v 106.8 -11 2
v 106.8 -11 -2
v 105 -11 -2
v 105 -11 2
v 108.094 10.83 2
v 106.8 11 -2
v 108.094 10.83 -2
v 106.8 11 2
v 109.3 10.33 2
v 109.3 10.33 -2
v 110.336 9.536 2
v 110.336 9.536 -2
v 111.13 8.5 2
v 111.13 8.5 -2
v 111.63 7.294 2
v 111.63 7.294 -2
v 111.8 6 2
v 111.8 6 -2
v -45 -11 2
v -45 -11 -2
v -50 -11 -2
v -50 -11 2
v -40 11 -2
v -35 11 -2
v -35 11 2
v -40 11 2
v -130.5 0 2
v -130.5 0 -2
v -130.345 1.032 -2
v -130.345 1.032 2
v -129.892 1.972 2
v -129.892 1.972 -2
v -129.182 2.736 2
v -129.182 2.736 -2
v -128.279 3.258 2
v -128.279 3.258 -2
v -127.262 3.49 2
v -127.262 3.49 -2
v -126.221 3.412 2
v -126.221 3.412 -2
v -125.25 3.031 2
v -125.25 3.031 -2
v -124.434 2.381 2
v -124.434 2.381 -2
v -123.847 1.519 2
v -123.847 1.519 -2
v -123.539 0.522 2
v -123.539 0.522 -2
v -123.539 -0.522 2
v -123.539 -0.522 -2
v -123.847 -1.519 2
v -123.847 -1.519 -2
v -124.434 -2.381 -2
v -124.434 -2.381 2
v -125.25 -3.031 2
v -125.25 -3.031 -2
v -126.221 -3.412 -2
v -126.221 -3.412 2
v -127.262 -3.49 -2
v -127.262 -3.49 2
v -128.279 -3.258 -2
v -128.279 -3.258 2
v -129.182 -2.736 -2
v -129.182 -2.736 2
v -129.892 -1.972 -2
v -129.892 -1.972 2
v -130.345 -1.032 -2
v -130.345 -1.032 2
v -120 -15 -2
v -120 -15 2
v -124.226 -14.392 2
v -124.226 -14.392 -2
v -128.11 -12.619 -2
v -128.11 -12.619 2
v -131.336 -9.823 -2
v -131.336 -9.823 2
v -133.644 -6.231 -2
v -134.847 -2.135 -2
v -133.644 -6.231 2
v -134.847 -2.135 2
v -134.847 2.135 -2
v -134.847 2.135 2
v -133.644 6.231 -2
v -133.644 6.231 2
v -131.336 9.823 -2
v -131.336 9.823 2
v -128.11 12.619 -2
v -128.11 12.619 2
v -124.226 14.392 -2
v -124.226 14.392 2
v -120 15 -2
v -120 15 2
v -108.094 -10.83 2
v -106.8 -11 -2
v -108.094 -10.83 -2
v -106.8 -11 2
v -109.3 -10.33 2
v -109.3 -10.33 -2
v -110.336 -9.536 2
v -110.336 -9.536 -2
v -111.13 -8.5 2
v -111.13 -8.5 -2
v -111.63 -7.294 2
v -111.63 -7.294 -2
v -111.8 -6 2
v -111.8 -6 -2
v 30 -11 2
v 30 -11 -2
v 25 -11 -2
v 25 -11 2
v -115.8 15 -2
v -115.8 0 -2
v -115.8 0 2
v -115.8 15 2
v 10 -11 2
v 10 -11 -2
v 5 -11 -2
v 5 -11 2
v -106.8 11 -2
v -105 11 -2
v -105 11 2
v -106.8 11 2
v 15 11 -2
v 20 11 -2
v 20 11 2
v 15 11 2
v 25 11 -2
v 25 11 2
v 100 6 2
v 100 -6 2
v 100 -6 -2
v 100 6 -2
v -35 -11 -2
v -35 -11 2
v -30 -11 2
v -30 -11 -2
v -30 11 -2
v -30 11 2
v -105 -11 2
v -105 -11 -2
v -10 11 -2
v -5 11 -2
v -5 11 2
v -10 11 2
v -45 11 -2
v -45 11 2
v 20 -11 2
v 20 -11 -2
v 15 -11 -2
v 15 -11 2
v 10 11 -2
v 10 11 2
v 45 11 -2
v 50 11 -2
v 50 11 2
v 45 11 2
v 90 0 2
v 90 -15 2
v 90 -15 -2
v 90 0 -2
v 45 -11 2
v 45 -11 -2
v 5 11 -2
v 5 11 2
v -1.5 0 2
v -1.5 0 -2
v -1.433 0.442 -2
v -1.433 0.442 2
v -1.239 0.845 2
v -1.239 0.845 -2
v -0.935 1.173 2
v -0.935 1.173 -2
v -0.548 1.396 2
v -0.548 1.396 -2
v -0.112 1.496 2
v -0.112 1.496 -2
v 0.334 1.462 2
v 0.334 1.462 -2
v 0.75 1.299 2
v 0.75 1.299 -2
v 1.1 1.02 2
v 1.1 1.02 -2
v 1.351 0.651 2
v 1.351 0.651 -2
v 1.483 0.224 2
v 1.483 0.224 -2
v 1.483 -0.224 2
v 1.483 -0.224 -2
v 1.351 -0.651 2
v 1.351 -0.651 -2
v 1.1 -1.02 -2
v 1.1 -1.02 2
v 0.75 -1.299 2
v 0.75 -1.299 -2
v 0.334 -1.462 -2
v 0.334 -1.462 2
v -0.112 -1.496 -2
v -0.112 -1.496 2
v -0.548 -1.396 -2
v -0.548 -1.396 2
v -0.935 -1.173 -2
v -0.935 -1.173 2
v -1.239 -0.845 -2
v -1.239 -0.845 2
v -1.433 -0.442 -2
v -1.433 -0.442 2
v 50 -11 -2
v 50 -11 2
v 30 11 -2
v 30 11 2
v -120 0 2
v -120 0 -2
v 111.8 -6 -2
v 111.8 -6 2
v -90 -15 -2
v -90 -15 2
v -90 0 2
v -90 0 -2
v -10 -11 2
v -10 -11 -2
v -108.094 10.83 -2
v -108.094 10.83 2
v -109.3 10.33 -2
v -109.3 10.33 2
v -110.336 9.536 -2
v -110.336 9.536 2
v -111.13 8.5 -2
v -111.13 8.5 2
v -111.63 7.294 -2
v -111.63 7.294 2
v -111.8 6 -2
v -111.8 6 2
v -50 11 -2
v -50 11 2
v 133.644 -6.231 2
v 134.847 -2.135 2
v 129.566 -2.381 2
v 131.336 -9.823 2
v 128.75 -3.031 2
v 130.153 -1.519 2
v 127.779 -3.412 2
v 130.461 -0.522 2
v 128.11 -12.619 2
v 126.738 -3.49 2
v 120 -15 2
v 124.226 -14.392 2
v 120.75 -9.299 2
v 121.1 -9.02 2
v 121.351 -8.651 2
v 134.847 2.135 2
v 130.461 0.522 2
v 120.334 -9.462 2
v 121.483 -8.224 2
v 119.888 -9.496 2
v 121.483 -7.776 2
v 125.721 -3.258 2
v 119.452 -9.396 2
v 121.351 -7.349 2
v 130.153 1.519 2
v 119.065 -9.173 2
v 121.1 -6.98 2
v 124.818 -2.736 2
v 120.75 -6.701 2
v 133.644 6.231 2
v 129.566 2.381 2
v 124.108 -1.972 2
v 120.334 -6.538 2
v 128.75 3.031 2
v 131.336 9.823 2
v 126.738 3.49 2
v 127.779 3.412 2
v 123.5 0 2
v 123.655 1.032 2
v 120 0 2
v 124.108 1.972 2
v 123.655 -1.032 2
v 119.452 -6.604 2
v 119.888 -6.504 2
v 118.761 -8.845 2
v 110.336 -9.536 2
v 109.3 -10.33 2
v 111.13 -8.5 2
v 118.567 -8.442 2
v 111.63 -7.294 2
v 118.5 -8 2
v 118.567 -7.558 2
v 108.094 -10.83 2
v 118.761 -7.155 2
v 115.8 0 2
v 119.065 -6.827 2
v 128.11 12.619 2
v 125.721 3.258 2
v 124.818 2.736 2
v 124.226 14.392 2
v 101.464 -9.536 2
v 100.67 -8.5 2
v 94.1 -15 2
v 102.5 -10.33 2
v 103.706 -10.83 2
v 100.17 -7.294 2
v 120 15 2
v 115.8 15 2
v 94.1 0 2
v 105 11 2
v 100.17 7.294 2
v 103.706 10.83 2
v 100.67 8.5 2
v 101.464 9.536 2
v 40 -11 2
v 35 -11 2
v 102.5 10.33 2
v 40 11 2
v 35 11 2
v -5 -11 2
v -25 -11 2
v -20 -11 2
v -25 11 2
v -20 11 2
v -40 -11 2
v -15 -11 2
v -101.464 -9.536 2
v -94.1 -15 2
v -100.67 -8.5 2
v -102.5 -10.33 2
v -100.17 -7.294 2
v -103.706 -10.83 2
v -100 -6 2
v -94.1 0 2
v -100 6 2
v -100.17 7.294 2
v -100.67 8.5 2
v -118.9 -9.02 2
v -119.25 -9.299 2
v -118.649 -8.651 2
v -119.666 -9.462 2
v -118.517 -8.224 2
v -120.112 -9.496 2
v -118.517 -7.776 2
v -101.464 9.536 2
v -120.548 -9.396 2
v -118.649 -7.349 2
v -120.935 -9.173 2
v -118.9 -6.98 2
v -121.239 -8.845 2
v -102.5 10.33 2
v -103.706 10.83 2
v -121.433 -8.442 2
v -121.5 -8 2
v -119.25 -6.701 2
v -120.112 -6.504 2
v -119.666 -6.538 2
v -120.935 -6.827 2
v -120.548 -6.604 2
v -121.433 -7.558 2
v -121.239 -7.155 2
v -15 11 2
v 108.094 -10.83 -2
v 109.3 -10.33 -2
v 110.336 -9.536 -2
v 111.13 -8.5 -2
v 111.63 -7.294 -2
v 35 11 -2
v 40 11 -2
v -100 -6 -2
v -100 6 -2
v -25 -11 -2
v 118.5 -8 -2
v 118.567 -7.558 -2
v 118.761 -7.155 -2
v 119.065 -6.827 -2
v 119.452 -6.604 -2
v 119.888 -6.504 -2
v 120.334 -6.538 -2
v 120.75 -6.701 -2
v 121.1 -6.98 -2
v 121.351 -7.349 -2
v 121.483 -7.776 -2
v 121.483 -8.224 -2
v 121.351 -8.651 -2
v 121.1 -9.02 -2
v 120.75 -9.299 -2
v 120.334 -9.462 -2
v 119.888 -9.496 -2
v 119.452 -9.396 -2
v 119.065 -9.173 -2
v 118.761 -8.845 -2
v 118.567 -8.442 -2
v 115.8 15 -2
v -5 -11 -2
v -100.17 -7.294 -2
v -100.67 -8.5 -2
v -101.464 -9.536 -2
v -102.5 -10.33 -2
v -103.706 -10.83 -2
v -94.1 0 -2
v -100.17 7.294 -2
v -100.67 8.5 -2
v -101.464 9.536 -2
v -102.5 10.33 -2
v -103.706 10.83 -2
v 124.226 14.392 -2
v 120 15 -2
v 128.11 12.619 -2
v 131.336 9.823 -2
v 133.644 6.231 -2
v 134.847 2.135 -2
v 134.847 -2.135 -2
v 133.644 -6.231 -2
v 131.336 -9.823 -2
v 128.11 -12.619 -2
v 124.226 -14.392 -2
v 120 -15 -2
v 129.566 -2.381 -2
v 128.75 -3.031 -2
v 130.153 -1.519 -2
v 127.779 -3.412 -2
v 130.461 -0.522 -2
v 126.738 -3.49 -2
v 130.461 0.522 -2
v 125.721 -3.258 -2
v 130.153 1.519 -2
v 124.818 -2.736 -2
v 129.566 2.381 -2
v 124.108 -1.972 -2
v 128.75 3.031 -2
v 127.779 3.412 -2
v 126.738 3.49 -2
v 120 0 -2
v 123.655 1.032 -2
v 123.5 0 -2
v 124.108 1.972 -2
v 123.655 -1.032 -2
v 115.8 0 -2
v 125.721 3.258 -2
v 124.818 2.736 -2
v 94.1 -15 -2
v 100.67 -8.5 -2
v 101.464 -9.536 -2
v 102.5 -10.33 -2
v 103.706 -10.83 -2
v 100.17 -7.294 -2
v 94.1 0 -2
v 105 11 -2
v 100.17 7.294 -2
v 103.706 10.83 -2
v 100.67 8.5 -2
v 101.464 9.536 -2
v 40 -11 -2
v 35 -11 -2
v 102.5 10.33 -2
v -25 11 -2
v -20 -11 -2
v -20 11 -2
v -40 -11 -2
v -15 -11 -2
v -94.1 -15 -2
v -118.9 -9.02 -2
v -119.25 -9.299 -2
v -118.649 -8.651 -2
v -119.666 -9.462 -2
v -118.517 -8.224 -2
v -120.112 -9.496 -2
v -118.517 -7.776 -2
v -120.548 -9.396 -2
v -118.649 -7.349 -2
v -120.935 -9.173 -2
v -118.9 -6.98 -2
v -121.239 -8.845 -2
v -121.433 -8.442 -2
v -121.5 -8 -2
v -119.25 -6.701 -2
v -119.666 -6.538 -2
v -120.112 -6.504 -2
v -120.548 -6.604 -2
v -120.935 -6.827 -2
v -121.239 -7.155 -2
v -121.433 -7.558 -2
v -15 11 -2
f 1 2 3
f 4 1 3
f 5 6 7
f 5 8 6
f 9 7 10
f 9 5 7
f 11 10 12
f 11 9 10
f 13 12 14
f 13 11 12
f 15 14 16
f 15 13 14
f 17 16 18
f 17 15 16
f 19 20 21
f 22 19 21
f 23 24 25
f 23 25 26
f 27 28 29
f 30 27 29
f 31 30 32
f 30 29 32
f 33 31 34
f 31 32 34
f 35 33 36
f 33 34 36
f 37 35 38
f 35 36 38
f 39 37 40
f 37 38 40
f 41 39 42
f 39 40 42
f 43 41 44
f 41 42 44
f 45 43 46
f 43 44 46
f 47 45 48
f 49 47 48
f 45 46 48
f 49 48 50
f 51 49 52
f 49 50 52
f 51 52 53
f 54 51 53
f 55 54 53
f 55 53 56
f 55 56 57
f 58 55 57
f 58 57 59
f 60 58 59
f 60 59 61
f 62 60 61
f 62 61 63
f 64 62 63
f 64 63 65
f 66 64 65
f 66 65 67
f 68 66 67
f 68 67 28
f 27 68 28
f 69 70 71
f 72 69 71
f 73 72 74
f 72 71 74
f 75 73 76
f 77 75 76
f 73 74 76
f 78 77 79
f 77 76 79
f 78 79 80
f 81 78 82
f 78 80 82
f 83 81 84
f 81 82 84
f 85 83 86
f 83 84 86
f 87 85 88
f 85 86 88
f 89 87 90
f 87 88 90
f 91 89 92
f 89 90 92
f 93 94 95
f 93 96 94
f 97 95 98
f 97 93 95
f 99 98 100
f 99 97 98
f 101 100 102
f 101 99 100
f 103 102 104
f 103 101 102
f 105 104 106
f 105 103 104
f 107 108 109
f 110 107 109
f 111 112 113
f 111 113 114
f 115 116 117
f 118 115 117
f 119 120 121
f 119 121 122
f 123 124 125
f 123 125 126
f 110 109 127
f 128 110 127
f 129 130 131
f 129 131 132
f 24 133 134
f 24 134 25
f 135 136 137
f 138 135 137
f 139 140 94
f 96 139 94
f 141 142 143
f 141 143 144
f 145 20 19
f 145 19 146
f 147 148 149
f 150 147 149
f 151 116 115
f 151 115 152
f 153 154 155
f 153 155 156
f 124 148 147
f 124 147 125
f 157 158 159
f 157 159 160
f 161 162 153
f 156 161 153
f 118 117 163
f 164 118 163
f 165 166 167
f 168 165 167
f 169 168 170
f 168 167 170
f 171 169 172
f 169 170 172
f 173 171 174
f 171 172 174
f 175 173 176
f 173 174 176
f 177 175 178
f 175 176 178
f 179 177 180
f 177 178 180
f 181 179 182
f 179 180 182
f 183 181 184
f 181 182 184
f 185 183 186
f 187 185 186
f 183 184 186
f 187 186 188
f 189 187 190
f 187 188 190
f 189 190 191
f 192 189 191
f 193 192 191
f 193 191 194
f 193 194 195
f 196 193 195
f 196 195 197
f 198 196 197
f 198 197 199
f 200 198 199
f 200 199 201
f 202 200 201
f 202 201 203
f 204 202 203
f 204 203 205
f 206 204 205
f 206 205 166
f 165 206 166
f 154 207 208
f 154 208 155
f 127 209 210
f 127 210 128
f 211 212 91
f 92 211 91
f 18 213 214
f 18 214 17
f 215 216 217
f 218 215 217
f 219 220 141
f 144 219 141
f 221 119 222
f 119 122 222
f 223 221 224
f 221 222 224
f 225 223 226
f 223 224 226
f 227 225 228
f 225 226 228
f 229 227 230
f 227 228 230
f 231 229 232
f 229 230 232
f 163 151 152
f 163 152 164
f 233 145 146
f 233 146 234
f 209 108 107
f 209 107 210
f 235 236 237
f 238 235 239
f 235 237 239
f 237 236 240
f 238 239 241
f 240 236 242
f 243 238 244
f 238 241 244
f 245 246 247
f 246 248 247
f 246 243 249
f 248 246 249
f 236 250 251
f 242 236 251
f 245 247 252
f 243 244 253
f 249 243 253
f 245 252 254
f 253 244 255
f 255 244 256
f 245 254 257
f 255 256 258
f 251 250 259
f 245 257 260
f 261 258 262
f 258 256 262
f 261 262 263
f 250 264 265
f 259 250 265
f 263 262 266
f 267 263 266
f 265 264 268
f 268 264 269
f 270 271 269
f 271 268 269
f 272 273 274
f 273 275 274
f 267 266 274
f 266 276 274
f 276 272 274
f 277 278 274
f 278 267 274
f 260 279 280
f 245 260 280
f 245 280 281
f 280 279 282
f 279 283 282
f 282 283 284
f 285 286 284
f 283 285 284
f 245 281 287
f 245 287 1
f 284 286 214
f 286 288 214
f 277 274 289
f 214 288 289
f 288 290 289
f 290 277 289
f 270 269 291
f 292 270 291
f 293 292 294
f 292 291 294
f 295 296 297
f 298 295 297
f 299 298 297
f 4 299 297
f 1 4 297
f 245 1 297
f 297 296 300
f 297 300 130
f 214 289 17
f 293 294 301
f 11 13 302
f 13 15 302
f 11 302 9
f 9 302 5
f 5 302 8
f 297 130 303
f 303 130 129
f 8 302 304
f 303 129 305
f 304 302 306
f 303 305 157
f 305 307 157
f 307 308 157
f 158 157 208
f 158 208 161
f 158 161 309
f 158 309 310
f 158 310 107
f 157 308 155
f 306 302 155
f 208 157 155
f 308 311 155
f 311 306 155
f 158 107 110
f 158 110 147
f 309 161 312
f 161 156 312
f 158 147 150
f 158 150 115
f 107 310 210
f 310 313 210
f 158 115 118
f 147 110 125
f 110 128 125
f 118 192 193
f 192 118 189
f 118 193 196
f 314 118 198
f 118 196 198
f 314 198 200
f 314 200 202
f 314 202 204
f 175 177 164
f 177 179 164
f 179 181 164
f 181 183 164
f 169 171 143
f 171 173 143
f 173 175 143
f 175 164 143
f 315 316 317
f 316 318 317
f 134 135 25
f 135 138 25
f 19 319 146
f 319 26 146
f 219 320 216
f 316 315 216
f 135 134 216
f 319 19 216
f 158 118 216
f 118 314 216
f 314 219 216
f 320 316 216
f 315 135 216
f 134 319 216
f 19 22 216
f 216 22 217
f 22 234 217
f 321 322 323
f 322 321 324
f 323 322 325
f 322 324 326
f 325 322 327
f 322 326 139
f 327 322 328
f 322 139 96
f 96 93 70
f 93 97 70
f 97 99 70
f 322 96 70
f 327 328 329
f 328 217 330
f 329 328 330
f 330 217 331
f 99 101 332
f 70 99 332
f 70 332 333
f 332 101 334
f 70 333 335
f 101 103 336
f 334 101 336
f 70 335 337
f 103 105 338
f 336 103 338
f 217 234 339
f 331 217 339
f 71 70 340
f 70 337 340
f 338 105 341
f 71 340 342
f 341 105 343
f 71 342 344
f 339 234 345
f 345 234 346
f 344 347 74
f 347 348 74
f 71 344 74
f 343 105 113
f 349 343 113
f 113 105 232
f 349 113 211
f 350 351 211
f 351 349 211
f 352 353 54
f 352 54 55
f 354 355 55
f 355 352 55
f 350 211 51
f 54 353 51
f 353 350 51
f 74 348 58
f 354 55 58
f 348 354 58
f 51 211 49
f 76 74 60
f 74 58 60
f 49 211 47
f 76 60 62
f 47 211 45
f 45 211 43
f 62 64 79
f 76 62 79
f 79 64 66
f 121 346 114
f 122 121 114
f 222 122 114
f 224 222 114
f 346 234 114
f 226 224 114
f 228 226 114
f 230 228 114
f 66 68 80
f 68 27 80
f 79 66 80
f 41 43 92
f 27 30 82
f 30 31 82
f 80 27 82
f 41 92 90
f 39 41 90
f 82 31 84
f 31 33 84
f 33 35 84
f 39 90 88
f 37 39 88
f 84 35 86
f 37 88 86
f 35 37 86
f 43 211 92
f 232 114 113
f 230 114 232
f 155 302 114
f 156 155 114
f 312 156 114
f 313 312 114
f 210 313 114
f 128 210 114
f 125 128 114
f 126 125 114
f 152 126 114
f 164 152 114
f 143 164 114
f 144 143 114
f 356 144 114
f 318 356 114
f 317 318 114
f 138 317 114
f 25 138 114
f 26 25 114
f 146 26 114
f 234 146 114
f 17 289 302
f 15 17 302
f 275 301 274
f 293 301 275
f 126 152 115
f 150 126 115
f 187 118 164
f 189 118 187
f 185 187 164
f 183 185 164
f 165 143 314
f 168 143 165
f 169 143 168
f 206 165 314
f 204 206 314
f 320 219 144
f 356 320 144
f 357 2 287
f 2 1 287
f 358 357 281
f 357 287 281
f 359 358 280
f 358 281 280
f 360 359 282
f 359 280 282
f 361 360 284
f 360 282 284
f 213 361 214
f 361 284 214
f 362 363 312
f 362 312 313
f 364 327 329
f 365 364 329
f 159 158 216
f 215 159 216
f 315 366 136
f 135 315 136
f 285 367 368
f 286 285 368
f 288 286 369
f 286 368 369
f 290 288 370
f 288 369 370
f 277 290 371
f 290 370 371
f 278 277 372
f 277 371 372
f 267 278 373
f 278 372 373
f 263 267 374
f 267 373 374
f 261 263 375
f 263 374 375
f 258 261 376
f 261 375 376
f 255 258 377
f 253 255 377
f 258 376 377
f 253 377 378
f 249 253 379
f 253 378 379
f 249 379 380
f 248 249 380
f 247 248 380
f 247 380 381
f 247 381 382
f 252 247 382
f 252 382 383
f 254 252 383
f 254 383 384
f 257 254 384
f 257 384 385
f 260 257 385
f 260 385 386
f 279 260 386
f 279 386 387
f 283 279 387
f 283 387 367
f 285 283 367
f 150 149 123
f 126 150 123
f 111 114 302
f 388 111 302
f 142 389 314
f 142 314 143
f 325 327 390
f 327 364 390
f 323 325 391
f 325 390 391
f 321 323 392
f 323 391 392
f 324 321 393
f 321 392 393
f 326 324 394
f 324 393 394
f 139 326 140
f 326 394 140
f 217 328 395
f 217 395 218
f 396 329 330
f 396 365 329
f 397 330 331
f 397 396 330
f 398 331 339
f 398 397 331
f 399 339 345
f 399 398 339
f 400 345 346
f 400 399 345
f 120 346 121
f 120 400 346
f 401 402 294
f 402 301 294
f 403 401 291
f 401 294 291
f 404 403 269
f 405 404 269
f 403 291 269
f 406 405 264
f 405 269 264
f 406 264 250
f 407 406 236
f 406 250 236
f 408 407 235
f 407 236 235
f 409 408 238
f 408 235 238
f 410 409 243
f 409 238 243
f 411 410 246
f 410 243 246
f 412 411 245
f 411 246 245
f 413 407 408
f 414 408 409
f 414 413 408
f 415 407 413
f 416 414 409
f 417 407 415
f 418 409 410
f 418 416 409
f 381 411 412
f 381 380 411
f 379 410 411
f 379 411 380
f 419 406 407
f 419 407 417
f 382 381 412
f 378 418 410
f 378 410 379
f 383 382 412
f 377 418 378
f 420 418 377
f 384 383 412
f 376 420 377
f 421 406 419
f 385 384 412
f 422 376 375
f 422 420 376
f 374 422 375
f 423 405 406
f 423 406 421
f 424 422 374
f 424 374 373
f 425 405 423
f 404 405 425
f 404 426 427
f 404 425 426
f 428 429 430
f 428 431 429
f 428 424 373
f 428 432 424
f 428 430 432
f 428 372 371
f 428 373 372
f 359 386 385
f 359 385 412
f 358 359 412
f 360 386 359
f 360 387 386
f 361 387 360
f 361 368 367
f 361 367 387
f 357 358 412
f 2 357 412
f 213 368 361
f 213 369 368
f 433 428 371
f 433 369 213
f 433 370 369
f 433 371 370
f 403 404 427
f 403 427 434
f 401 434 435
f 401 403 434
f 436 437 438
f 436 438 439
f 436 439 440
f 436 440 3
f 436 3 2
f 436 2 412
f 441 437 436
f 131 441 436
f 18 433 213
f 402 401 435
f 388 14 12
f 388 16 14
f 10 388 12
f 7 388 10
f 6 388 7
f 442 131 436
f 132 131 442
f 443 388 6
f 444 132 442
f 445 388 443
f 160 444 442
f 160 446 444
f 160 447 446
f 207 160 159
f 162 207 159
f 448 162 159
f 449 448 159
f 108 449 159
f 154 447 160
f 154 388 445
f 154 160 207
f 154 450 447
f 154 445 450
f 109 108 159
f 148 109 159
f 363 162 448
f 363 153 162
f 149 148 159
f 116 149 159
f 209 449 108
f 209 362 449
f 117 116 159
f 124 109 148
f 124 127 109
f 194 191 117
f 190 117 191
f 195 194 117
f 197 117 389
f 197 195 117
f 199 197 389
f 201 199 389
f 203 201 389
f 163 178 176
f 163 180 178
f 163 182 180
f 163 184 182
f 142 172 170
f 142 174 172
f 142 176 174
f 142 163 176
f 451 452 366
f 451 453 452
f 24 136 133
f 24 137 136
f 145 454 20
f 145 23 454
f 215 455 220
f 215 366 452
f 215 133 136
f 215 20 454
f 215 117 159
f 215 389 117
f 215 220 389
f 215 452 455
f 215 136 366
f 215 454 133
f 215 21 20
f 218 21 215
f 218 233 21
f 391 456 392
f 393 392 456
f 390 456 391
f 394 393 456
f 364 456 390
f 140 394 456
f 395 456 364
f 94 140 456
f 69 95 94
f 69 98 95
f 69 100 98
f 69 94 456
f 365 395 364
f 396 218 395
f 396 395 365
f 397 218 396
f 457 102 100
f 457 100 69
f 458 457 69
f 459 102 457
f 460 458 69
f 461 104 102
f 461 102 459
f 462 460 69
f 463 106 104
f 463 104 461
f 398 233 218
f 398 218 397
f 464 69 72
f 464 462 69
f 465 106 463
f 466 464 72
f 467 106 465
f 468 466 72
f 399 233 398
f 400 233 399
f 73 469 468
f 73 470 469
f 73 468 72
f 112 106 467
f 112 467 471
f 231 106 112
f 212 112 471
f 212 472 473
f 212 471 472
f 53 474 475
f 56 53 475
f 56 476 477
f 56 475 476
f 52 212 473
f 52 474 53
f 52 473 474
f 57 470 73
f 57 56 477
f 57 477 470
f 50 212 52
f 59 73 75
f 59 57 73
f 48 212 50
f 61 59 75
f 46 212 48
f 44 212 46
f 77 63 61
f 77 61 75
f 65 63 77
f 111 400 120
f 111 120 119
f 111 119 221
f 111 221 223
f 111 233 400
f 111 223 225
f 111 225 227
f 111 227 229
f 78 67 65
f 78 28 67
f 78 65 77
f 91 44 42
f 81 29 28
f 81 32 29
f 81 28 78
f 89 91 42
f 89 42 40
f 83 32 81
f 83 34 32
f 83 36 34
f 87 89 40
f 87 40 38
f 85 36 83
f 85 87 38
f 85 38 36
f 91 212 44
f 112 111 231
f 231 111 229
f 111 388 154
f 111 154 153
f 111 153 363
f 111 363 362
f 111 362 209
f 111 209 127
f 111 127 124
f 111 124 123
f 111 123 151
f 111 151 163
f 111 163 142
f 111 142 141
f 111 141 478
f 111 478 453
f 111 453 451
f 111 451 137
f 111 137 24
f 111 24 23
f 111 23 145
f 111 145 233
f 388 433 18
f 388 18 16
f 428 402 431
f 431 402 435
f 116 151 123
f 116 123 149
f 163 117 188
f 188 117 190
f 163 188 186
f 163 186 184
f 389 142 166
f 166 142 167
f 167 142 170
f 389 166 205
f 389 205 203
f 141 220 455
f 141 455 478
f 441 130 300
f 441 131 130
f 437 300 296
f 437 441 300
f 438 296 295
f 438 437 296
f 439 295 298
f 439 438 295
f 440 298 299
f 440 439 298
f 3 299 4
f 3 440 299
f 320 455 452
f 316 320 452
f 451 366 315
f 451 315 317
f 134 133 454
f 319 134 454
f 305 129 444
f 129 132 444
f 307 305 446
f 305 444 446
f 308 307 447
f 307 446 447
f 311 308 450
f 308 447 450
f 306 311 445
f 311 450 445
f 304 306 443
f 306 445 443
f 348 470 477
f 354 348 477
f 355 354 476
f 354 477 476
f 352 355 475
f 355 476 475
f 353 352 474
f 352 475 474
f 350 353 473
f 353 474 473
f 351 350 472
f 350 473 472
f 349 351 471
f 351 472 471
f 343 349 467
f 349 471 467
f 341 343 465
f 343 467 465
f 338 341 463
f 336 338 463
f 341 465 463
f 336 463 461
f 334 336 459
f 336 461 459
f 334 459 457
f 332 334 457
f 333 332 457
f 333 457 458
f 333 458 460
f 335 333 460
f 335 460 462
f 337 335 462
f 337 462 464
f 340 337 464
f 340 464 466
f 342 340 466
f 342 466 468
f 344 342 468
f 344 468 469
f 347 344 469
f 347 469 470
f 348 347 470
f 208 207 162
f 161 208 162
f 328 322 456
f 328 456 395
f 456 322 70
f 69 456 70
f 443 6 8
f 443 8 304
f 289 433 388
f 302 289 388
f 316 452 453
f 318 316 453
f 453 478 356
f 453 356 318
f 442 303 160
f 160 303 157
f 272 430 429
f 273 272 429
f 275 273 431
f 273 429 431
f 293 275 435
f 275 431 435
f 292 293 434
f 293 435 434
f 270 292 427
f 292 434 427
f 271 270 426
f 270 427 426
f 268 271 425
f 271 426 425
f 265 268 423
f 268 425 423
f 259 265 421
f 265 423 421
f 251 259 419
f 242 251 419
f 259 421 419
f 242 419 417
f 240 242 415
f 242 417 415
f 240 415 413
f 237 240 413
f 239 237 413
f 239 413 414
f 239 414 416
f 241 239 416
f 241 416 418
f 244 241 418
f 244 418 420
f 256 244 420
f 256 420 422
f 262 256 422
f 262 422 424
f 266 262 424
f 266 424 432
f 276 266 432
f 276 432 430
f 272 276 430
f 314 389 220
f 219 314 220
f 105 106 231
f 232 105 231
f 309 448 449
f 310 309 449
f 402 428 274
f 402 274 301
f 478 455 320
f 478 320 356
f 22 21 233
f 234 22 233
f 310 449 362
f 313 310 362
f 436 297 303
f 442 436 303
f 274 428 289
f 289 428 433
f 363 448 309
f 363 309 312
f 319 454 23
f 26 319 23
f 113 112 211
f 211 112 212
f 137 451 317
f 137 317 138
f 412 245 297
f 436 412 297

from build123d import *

# Parameters (mm, degrees)
EXTRUDE_1_DEPTH     = 2
SKETCH_11_W         = 4.2
SKETCH_11_H         = 15
SKETCH_11_W_2       = 46.8
SKETCH_11_H_2       = 22
SKETCH_11_W_3       = 5
SKETCH_11_R         = 3.5
SKETCH_11_R_2       = 1.5
CUT_EXTRUDE_1_DEPTH = 10
SKETCH_12_W         = 45
SKETCH_12_H         = 22
EXTRUDE_2_DEPTH     = 4
SKETCH_13_W         = 4.1
SKETCH_13_H         = 15
CUT_EXTRUDE_2_DEPTH = 136.889661123
FILLET_1_R          = 5


with BuildPart() as part:
    # Эскиз1 → Бобышка-Вытянуть1 (new, symmetric)
    with BuildSketch(Plane.XY):
        with BuildLine():
            Line((-120, 15), (120, 15))
            ThreePointArc((120, 15), (135, 0), (120, -15))
            Line((120, -15), (-120, -15))
            ThreePointArc((-120, -15), (-135, 0), (-120, 15))
        make_face()
    extrude(amount=EXTRUDE_1_DEPTH, both=True)

    # Эскиз11 → Вырез-Вытянуть1 (cut)
    with BuildSketch(Plane(origin=(0, 0, -2), x_dir=(-1, 0, 0), z_dir=(0, 0, -1))):
        with Locations((-117.9, 7.5)):
            Rectangle(SKETCH_11_W, SKETCH_11_H)
        with Locations((-88.4, 0)):
            Rectangle(SKETCH_11_W_2, SKETCH_11_H_2)
        with Locations((-57.5, 0)):
            Rectangle(SKETCH_11_W_3, SKETCH_11_H_2)
        with Locations((-47.5, 0)):
            Rectangle(SKETCH_11_W_3, SKETCH_11_H_2)
        with Locations((-37.5, 0)):
            Rectangle(SKETCH_11_W_3, SKETCH_11_H_2)
        with Locations((-27.5, 0)):
            Rectangle(SKETCH_11_W_3, SKETCH_11_H_2)
        with Locations((-17.5, 0)):
            Rectangle(SKETCH_11_W_3, SKETCH_11_H_2)
        with Locations((-7.5, 0)):
            Rectangle(SKETCH_11_W_3, SKETCH_11_H_2)
        with Locations((7.5, 0)):
            Rectangle(SKETCH_11_W_3, SKETCH_11_H_2)
        with Locations((17.5, 0)):
            Rectangle(SKETCH_11_W_3, SKETCH_11_H_2)
        with Locations((27.5, 0)):
            Rectangle(SKETCH_11_W_3, SKETCH_11_H_2)
        with Locations((37.5, 0)):
            Rectangle(SKETCH_11_W_3, SKETCH_11_H_2)
        with Locations((47.5, 0)):
            Rectangle(SKETCH_11_W_3, SKETCH_11_H_2)
        with Locations((57.5, 0)):
            Rectangle(SKETCH_11_W_3, SKETCH_11_H_2)
        with Locations((88.4, 0)):
            Rectangle(SKETCH_11_W_2, SKETCH_11_H_2)
        with Locations((117.9, 7.5)):
            Rectangle(SKETCH_11_W, SKETCH_11_H)
        with Locations((127, 0)):
            Circle(SKETCH_11_R)
        with Locations((-127, 0)):
            Circle(SKETCH_11_R)
        Circle(SKETCH_11_R_2)
        with Locations((-120, -8)):
            Circle(SKETCH_11_R_2)
        with Locations((120, -8)):
            Circle(SKETCH_11_R_2)
    extrude(amount=-CUT_EXTRUDE_1_DEPTH, mode=Mode.SUBTRACT)

    # Эскиз12 → Бобышка-Вытянуть2 (add)
    with BuildSketch(Plane.XY.offset(2)):
        with Locations((-77.5, 0)):
            Rectangle(SKETCH_12_W, SKETCH_12_H)
    extrude_2 = extrude(amount=-EXTRUDE_2_DEPTH)

    # Зеркальное отражение1: Бобышка-Вытянуть2 across plane
    add(extrude_2.mirror(Plane(origin=(0, 0, 0), x_dir=(0, 0, 1), z_dir=(1, 0, 0))))

    # Эскиз13 → Вырез-Вытянуть2 (cut, through all)
    with BuildSketch(Plane.XY.offset(2)):
        with Locations((-92.05, -7.5)):
            Rectangle(SKETCH_13_W, SKETCH_13_H)
    cut_extrude_2 = extrude(amount=-CUT_EXTRUDE_2_DEPTH, mode=Mode.SUBTRACT)

    # Зеркальное отражение2: Вырез-Вытянуть2 across plane
    add(cut_extrude_2.mirror(Plane(origin=(0, 0, 0), x_dir=(0, 0, 1), z_dir=(1, 0, 0))), mode=Mode.SUBTRACT)

    # Скругление1
    fillet_1_edges = [part.edges().sort_by_distance(p)[0] for p in [
        (-111.8, 11, 0),
        (-111.8, -11, 0),
        (-100, 11, 0),
        (-100, -11, 0),
        (100, -11, 0),
        (100, 11, 0),
        (111.8, -11, 0),
        (111.8, 11, 0),
    ]]
    fillet(fillet_1_edges, radius=FILLET_1_R)


solid = part.part
